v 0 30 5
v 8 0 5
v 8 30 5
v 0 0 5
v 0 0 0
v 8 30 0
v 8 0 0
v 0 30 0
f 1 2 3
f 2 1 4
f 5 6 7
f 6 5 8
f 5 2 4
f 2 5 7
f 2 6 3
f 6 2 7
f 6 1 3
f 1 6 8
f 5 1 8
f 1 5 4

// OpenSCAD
module slab(w, l, t) {
  cube([w, l, t]);
}
slab(8, 30, 5);
